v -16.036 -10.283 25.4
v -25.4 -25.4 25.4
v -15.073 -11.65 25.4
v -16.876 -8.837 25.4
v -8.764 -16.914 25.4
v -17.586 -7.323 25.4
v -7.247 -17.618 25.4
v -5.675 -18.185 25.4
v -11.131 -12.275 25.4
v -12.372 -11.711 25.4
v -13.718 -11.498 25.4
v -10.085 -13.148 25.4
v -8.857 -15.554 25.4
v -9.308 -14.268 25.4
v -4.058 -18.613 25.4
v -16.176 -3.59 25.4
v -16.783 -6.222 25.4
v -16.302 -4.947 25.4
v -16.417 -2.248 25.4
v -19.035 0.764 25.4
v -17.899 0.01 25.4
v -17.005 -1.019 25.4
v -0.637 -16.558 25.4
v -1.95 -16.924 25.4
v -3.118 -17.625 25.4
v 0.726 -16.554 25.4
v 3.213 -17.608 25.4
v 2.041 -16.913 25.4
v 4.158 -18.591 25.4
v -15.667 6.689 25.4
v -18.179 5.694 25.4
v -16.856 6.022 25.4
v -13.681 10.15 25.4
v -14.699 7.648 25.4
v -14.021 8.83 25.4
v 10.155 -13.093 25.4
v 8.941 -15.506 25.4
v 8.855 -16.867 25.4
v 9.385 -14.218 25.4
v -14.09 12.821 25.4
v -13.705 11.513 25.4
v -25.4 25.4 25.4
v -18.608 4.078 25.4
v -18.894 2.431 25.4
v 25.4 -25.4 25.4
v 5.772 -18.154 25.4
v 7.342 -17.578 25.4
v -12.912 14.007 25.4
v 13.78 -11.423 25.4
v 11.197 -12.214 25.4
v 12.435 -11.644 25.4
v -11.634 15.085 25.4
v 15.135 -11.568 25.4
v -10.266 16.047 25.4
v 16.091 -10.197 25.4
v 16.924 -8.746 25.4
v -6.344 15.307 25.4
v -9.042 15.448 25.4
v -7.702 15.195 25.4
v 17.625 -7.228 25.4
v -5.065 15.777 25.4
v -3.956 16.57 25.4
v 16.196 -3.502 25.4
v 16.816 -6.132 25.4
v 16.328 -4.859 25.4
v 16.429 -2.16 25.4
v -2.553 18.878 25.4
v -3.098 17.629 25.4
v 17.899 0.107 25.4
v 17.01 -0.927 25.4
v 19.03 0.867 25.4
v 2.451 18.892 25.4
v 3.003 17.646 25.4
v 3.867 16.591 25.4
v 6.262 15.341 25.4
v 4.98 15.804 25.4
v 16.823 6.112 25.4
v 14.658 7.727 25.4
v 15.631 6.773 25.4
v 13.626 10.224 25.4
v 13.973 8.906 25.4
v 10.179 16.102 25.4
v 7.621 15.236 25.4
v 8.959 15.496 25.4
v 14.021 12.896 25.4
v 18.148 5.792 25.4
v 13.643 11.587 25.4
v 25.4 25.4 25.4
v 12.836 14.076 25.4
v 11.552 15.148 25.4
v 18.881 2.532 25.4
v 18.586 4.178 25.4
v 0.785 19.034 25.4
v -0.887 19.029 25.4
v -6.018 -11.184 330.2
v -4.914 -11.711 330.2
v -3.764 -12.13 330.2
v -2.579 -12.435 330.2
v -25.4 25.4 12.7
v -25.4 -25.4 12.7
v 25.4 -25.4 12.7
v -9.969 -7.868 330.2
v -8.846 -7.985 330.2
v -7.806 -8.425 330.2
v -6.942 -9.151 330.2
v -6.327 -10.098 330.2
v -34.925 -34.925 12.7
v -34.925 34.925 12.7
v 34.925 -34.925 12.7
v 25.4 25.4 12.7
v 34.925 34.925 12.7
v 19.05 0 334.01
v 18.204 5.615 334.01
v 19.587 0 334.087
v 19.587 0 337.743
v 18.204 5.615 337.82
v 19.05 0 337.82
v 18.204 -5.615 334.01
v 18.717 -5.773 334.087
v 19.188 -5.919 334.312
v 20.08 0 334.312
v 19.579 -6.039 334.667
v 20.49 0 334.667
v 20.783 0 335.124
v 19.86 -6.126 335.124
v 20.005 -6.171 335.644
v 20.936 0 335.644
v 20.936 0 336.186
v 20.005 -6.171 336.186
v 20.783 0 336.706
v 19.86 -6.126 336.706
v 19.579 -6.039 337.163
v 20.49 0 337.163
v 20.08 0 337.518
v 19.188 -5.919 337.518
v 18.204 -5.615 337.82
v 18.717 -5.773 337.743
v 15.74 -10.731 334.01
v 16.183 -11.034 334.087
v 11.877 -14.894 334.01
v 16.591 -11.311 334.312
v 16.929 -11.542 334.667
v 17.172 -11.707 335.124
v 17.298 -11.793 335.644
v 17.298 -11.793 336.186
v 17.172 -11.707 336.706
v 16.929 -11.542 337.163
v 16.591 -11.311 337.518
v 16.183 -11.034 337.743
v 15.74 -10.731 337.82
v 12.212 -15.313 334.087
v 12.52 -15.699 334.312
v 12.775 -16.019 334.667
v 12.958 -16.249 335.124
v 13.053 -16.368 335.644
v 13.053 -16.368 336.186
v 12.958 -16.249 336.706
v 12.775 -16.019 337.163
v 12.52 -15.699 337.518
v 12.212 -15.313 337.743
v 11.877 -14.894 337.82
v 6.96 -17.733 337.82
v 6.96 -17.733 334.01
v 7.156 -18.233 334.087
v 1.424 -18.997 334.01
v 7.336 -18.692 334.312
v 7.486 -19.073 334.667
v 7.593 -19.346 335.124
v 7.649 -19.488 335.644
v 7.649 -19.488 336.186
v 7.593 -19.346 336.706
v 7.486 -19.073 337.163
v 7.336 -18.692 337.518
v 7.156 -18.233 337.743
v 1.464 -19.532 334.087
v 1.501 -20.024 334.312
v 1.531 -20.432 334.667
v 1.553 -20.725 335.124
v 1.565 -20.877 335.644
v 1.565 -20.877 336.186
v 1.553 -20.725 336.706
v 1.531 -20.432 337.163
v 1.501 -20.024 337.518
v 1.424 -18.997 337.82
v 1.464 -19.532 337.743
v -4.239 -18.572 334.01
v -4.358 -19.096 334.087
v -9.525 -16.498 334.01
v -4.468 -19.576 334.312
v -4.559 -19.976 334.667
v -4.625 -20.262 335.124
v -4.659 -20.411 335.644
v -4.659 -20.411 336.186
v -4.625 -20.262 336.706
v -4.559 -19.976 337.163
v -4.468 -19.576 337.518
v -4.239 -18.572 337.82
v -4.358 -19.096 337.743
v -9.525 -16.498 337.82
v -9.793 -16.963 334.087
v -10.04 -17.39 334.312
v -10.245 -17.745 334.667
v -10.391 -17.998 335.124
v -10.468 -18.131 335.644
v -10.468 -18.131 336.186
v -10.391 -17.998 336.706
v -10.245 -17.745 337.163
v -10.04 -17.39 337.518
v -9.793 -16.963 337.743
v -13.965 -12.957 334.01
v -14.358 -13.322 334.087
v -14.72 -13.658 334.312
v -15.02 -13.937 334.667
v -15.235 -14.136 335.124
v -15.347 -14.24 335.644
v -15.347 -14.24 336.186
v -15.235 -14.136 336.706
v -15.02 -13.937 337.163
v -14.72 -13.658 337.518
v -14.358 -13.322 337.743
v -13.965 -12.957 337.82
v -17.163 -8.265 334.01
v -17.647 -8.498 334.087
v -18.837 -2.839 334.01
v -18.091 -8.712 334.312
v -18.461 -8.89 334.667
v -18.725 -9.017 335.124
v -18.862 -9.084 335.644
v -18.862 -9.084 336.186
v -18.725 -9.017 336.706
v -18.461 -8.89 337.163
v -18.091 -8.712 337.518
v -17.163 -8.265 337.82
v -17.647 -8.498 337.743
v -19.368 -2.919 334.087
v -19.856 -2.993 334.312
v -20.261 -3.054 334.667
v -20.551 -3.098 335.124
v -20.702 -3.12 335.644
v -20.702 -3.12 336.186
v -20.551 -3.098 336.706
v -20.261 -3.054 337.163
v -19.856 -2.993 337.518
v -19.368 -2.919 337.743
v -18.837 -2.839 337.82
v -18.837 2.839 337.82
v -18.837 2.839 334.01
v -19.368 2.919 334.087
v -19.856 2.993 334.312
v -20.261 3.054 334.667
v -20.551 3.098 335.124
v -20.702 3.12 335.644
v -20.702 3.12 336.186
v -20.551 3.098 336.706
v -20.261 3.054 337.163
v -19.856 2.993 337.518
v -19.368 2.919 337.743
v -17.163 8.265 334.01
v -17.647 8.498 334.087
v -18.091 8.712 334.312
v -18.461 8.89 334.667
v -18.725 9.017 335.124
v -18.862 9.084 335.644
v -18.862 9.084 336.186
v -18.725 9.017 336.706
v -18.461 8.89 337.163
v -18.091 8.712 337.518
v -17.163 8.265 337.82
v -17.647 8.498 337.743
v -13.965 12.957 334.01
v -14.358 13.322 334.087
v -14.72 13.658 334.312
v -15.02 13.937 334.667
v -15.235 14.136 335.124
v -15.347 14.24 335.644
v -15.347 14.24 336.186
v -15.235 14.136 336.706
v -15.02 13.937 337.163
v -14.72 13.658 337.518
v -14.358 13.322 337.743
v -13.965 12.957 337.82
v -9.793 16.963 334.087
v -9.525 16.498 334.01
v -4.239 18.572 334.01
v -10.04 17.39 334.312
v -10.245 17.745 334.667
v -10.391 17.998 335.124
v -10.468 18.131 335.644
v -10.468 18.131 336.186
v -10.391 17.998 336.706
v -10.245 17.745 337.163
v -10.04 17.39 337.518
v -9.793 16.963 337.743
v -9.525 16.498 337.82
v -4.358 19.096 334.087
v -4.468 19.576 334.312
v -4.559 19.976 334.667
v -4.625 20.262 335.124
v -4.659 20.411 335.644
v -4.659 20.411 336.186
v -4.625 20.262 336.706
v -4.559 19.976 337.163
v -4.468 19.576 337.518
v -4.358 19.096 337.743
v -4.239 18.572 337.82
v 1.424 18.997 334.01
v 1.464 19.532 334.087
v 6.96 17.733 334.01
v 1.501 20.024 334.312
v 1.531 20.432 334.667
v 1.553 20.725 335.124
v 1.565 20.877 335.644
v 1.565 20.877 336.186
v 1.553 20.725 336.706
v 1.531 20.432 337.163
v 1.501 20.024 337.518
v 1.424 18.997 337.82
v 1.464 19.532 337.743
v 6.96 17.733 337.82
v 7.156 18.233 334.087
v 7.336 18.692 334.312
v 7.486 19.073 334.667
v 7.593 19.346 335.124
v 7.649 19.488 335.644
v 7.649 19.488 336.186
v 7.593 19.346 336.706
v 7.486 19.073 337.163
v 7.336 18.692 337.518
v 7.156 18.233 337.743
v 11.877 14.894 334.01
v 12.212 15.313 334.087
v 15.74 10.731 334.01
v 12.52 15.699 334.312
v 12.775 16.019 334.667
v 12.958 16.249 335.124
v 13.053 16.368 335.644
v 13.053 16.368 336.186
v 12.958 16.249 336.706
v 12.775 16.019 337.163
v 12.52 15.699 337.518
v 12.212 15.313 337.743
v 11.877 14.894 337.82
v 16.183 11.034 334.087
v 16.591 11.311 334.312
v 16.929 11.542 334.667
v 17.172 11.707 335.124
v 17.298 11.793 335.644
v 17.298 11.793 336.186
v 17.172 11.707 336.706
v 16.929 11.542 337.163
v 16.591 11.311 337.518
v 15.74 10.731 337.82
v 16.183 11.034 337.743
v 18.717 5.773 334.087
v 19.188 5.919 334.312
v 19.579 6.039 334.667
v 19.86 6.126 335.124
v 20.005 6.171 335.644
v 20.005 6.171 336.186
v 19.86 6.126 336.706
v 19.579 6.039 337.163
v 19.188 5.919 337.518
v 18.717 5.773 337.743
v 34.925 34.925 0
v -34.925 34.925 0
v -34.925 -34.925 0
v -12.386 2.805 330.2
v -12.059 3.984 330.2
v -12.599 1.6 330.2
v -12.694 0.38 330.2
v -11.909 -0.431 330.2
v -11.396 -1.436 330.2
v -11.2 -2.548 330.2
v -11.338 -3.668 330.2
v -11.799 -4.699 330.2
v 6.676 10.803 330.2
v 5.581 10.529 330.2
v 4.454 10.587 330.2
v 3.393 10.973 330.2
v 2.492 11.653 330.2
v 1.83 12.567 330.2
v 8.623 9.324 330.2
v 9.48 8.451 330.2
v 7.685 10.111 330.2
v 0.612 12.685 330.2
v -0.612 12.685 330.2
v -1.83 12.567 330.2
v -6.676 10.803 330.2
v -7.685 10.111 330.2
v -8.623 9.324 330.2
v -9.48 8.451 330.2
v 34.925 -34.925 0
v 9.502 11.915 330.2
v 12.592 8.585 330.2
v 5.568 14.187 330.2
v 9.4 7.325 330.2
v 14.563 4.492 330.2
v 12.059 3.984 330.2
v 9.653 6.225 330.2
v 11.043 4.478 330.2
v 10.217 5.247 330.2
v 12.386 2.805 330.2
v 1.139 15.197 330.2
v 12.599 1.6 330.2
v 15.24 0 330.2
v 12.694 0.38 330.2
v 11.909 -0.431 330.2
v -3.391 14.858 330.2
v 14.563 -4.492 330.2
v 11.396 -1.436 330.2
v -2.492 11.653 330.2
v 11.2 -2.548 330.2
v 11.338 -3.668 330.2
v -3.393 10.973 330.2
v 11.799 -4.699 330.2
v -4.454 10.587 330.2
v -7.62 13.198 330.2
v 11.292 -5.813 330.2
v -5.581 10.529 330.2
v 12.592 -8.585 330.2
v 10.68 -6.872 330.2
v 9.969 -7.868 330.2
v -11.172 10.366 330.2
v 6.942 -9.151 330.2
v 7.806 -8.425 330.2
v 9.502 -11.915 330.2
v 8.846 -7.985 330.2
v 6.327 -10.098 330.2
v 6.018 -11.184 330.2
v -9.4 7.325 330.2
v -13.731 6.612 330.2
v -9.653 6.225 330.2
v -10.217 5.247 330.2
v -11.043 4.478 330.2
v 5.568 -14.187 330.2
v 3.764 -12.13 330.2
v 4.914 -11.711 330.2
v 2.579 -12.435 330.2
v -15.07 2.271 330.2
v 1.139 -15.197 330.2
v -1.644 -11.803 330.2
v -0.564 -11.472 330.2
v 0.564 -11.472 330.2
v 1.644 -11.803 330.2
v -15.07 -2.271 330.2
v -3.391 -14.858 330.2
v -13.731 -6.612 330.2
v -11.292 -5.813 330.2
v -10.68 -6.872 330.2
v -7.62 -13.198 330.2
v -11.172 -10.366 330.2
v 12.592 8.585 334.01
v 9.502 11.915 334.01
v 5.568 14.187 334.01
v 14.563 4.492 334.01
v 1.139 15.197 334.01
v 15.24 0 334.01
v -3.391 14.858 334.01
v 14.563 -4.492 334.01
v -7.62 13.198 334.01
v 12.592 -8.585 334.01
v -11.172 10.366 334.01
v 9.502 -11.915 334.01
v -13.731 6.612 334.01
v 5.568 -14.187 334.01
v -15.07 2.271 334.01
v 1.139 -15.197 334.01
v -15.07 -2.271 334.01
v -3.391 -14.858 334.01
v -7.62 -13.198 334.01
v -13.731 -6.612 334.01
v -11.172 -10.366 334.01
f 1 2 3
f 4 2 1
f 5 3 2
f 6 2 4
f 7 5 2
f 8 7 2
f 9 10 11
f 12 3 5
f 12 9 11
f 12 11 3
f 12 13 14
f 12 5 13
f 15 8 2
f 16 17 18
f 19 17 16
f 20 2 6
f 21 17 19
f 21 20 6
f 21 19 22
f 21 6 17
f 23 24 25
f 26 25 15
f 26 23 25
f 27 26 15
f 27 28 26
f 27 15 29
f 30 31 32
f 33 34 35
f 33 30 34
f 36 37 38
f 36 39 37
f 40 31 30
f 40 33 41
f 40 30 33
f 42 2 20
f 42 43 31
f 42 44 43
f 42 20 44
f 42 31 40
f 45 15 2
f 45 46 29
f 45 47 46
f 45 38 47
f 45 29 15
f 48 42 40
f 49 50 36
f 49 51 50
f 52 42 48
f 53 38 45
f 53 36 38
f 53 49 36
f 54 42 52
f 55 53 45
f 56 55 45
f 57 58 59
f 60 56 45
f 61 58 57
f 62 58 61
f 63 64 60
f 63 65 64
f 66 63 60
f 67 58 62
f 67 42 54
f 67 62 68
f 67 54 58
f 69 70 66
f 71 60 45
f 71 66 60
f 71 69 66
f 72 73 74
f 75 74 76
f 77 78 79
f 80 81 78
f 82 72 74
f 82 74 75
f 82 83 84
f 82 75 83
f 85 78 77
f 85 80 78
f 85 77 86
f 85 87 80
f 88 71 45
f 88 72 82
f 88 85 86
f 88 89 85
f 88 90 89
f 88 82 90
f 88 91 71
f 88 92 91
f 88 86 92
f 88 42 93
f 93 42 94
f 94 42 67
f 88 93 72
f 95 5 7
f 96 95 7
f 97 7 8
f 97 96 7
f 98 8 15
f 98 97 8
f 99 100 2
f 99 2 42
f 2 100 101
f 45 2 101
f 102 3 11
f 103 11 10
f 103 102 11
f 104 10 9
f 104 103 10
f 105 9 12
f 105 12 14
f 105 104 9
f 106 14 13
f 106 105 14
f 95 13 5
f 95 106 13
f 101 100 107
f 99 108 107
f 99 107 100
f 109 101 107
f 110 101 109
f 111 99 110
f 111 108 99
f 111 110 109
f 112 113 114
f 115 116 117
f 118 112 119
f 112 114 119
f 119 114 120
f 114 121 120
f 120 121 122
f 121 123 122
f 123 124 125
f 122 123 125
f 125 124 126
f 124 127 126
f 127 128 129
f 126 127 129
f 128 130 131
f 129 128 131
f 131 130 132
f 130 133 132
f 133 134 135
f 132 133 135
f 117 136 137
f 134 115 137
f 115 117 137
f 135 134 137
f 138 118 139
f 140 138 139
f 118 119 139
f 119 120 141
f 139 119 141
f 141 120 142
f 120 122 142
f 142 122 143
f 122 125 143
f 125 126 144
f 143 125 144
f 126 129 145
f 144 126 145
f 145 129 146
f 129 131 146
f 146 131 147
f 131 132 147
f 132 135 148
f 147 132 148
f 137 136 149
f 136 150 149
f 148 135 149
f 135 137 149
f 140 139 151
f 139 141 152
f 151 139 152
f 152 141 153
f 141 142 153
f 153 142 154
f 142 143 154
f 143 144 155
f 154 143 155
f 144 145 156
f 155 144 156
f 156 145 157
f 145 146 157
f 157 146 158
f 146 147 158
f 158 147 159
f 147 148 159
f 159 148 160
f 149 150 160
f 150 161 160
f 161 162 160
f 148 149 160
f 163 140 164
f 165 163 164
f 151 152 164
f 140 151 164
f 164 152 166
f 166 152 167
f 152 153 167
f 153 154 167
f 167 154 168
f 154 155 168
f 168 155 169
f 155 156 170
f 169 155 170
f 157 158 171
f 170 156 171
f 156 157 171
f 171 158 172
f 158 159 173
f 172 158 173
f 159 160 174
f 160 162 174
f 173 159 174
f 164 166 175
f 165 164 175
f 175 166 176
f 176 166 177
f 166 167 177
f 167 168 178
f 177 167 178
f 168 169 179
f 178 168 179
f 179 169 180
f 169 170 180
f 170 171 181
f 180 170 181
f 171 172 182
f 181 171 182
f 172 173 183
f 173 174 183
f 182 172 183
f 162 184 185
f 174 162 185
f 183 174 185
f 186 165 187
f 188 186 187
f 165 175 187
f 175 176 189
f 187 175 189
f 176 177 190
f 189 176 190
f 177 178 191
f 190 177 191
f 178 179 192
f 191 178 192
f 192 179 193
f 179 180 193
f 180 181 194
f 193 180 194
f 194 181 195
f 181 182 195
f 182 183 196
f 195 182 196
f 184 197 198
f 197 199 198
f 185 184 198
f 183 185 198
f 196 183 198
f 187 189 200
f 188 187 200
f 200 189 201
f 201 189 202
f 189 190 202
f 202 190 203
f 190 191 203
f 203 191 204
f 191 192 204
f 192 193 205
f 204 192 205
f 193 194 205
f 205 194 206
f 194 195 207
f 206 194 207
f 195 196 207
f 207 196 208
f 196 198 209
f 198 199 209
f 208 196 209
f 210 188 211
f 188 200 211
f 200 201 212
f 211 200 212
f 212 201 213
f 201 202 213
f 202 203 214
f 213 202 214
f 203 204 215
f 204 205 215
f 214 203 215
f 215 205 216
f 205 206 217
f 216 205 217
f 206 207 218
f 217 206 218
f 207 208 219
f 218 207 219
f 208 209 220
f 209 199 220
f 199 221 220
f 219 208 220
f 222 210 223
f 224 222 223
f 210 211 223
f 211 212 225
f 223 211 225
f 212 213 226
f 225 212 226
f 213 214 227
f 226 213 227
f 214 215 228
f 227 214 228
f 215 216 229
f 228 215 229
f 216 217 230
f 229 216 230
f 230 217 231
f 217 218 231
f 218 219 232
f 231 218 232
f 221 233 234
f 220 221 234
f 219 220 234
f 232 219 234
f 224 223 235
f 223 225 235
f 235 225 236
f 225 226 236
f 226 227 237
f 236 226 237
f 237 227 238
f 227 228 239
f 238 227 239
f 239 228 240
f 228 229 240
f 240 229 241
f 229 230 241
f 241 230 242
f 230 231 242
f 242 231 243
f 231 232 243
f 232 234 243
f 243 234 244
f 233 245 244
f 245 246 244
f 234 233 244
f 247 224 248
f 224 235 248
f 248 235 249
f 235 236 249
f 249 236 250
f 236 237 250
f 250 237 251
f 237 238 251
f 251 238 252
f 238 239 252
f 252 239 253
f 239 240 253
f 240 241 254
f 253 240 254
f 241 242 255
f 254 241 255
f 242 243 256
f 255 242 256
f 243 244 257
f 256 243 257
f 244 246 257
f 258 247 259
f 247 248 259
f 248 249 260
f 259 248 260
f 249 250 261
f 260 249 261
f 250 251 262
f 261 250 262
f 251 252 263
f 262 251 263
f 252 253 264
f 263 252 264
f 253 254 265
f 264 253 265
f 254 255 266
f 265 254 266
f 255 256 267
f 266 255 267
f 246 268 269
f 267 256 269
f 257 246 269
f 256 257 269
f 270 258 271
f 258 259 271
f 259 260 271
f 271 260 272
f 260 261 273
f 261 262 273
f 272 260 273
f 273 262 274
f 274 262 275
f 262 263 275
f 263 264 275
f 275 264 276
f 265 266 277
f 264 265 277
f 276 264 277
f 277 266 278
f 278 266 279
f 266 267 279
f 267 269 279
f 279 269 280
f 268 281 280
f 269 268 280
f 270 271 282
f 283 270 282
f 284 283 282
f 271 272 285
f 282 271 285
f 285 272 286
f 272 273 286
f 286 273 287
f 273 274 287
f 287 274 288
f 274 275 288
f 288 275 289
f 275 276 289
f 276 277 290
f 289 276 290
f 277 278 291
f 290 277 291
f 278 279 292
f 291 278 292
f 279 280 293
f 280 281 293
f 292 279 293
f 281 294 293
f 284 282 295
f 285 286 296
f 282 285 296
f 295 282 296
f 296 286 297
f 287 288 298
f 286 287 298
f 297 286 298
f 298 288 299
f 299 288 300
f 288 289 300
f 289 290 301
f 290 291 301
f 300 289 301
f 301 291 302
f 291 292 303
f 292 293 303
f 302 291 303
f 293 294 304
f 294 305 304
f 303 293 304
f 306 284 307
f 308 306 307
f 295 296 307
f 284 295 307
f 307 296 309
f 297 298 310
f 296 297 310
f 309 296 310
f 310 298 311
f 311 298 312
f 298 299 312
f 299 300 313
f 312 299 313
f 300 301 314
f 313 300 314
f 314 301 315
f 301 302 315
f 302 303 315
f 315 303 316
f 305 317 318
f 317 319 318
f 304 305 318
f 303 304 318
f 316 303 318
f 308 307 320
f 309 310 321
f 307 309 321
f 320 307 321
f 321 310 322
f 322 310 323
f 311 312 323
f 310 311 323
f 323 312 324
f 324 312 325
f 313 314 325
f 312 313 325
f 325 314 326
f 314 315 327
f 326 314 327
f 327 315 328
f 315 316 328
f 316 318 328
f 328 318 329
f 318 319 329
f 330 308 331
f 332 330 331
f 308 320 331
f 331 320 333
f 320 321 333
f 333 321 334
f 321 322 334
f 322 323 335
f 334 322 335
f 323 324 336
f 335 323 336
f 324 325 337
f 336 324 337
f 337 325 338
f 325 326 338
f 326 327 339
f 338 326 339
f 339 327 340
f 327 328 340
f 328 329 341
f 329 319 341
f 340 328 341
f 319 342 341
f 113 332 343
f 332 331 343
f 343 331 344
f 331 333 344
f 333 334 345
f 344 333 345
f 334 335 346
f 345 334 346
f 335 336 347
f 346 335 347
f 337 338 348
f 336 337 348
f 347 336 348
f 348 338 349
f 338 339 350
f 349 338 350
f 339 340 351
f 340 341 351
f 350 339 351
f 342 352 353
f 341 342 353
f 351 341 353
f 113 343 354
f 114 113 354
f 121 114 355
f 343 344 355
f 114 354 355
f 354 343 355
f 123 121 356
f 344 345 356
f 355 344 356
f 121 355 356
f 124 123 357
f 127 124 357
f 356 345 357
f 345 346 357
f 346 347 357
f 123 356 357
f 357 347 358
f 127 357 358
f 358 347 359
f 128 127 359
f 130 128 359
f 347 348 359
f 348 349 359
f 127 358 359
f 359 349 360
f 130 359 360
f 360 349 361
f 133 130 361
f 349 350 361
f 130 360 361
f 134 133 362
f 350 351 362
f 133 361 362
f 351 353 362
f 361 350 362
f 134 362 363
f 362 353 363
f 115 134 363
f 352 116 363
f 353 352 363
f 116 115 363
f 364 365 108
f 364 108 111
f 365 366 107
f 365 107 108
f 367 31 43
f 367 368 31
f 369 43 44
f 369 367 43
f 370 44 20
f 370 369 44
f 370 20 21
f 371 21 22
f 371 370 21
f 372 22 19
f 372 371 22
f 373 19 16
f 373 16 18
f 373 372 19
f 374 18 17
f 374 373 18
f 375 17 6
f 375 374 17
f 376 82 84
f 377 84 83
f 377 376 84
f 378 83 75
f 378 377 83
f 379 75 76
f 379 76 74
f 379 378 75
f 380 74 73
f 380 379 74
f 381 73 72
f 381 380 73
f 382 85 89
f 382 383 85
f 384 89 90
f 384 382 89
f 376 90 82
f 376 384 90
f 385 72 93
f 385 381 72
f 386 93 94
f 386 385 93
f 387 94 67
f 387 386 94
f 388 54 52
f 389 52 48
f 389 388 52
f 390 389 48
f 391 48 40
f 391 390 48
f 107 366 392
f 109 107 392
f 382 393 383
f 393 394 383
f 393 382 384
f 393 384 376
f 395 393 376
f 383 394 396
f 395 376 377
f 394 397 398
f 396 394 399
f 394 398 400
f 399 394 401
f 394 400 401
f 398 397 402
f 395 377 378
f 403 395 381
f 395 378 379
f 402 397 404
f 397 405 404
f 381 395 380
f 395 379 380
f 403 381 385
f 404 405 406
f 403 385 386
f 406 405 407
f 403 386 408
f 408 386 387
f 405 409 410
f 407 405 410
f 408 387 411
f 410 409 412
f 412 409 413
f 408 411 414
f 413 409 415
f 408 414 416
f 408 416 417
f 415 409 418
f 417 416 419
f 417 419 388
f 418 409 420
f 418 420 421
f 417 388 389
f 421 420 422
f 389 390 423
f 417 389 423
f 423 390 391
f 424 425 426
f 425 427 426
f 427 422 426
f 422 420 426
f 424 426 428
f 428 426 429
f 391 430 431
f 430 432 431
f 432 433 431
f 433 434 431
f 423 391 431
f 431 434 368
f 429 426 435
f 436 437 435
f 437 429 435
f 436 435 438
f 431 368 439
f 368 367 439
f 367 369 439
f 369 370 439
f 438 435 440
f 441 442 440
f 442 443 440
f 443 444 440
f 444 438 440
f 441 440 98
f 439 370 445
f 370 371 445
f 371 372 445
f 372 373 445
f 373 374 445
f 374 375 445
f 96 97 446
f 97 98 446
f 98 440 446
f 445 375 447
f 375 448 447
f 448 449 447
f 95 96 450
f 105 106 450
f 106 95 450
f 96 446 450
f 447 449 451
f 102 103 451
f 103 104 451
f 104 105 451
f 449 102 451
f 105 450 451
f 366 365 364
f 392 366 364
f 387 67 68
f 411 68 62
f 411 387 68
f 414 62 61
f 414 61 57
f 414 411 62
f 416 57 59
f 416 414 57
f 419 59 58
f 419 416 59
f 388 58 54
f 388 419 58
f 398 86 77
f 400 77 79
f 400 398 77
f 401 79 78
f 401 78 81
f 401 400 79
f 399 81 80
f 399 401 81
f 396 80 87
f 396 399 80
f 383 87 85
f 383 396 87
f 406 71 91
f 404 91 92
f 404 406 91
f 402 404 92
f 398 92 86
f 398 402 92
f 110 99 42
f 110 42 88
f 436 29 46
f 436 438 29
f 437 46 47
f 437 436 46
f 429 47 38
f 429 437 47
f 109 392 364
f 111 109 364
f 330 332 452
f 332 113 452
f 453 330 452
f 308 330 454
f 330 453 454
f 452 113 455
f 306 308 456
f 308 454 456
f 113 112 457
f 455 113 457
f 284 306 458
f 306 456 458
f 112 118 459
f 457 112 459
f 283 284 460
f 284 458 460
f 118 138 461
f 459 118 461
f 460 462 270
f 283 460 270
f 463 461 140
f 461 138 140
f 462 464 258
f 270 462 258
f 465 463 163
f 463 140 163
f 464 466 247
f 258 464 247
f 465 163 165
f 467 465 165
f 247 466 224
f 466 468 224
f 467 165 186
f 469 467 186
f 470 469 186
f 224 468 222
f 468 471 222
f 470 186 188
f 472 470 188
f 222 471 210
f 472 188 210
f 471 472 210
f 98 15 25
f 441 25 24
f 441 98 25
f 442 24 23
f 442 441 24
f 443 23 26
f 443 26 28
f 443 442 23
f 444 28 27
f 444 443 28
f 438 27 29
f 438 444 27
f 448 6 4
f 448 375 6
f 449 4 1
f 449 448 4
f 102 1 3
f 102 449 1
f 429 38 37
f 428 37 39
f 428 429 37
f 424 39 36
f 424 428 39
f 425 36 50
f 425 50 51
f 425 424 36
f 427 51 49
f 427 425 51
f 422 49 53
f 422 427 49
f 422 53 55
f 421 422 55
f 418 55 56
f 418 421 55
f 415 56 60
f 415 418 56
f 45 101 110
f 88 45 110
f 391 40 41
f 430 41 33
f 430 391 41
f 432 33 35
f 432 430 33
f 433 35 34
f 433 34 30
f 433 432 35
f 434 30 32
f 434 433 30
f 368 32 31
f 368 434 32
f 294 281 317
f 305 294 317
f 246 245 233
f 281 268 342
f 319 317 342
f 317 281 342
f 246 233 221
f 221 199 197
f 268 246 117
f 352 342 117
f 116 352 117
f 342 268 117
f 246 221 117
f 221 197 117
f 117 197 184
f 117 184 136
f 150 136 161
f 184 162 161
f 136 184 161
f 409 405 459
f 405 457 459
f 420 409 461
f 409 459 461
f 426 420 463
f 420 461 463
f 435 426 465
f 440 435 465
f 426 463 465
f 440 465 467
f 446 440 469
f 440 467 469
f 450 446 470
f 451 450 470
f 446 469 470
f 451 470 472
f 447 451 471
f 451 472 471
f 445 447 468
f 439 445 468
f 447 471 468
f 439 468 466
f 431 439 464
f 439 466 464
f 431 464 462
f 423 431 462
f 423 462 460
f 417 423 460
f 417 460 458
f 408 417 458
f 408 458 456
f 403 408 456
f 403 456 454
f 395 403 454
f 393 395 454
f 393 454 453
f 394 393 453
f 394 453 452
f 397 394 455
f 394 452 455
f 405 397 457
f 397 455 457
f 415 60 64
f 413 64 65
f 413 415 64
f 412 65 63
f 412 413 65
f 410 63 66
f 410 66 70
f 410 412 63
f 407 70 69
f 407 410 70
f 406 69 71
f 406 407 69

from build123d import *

# Parameters (mm, degrees)
F0_W     = 69.85
F0_H     = 69.85
F0_W_2   = 50.8
F0_H_2   = 50.8
F1_DEPTH = 12.7
F2_DEPTH = 25.4


with BuildPart() as f1:
    # F0 (on Top) → F1 (new body)
    with BuildSketch(Plane.XY):
        Rectangle(F0_W, F0_H)
        Rectangle(F0_W_2, F0_H_2, mode=Mode.SUBTRACT)
        Rectangle(F0_W_2, F0_H_2)
    extrude(amount=F1_DEPTH)

    # F0 (on Top) → F2 (join)
    with BuildSketch(Plane.XY):
        Rectangle(F0_W_2, F0_H_2)
    extrude(amount=F2_DEPTH)

    # F4 (on face) → F6 section 0
    with BuildSketch(Plane.XY.offset(25.4)):
        with BuildLine():
            ThreePointArc((17.625322, -7.228452), (16.266838, -2.823131), (19.030268, 0.866826))
            ThreePointArc((19.030268, 0.866826), (18.75161, 3.358513), (18.148139, 5.792023))
            ThreePointArc((18.148139, 5.792023), (14.275795, 8.293478), (14.020846, 12.896448))
            ThreePointArc((14.020846, 12.896448), (12.205757, 14.626073), (10.179241, 16.102346))
            ThreePointArc((10.179241, 16.102346), (5.604948, 15.529477), (2.450914, 18.891679))
            ThreePointArc((2.450914, 18.891679), (-0.051306, 19.049931), (-2.552638, 18.878203))
            ThreePointArc((-2.552638, 18.878203), (-5.688516, 15.499061), (-10.265828, 16.047283))
            ThreePointArc((-10.265828, 16.047283), (-12.284362, 14.560115), (-14.090109, 12.820738))
            ThreePointArc((-14.090109, 12.820738), (-14.32026, 8.216462), (-18.179075, 5.694185))
            ThreePointArc((-18.179075, 5.694185), (-18.769429, 3.257459), (-19.034661, 0.764308))
            ThreePointArc((-19.034661, 0.764308), (-16.251396, -2.910711), (-17.586131, -7.323285))
            ThreePointArc((-17.586131, -7.323285), (-16.472071, -9.569398), (-15.072684, -11.649751))
            ThreePointArc((-15.072684, -11.649751), (-10.578322, -12.67593), (-8.764441, -16.914109))
            ThreePointArc((-8.764441, -16.914109), (-6.467248, -17.918627), (-4.05803, -18.612761))
            ThreePointArc((-4.05803, -18.612761), (0.044465, -16.50994), (4.158228, -18.590633))
            ThreePointArc((4.158228, -18.590633), (6.563672, -17.883532), (8.855421, -16.866654))
            ThreePointArc((8.855421, -16.866654), (10.646447, -12.618766), (15.135216, -11.568393))
            ThreePointArc((15.135216, -11.568393), (16.523377, -9.480533), (17.625322, -7.228452))
        make_face()
    # F5 (on offset) → F6 section 1
    with BuildSketch(Plane.XY.offset(330.2)):
        with BuildLine():
            ThreePointArc((11.798684, -4.699048), (11.256353, -1.984799), (12.694305, 0.380274))
            ThreePointArc((12.694305, 0.380274), (12.507058, 2.205332), (12.058806, 3.984368))
            ThreePointArc((12.058806, 3.984368), (9.89867, 5.715), (9.479967, 8.451049))
            ThreePointArc((9.479967, 8.451049), (8.163403, 9.728764), (6.676479, 10.803454))
            ThreePointArc((6.676479, 10.803454), (3.90929, 10.740687), (1.829847, 12.567484))
            ThreePointArc((1.829847, 12.567484), (0, 12.7), (-1.829847, 12.567484))
            ThreePointArc((-1.829847, 12.567484), (-3.90929, 10.740687), (-6.676479, 10.803454))
            ThreePointArc((-6.676479, 10.803454), (-8.163403, 9.728764), (-9.479967, 8.451049))
            ThreePointArc((-9.479967, 8.451049), (-9.89867, 5.715), (-12.058806, 3.984368))
            ThreePointArc((-12.058806, 3.984368), (-12.507058, 2.205332), (-12.694305, 0.380274))
            ThreePointArc((-12.694305, 0.380274), (-11.256353, -1.984799), (-11.798684, -4.699048))
            ThreePointArc((-11.798684, -4.699048), (-10.998523, -6.35), (-9.968837, -7.868436))
            ThreePointArc((-9.968837, -7.868436), (-7.347062, -8.755888), (-6.017826, -11.183728))
            ThreePointArc((-6.017826, -11.183728), (-4.343656, -11.934096), (-2.578839, -12.435417))
            ThreePointArc((-2.578839, -12.435417), (0, -11.43), (2.578839, -12.435417))
            ThreePointArc((2.578839, -12.435417), (4.343656, -11.934096), (6.017826, -11.183728))
            ThreePointArc((6.017826, -11.183728), (7.347062, -8.755888), (9.968837, -7.868436))
            ThreePointArc((9.968837, -7.868436), (10.998523, -6.35), (11.798684, -4.699048))
        make_face()
    loft()

    # F7 (on Front) → F8 (revolve)
    with BuildSketch(Plane.XZ):
        with BuildLine():
            Line((0, 337.82), (0, 330.2))
            Line((0, 330.2), (15.24, 330.2))
            Line((15.24, 330.2), (15.24, 334.01))
            Line((15.24, 334.01), (19.05, 334.01))
            ThreePointArc((19.05, 334.01), (20.955, 335.915), (19.05, 337.82))
            Line((19.05, 337.82), (0, 337.82))
        make_face()
    revolve(axis=Axis((0, 0, 334.01), (0, 0, -1)))


solid = f1.part
